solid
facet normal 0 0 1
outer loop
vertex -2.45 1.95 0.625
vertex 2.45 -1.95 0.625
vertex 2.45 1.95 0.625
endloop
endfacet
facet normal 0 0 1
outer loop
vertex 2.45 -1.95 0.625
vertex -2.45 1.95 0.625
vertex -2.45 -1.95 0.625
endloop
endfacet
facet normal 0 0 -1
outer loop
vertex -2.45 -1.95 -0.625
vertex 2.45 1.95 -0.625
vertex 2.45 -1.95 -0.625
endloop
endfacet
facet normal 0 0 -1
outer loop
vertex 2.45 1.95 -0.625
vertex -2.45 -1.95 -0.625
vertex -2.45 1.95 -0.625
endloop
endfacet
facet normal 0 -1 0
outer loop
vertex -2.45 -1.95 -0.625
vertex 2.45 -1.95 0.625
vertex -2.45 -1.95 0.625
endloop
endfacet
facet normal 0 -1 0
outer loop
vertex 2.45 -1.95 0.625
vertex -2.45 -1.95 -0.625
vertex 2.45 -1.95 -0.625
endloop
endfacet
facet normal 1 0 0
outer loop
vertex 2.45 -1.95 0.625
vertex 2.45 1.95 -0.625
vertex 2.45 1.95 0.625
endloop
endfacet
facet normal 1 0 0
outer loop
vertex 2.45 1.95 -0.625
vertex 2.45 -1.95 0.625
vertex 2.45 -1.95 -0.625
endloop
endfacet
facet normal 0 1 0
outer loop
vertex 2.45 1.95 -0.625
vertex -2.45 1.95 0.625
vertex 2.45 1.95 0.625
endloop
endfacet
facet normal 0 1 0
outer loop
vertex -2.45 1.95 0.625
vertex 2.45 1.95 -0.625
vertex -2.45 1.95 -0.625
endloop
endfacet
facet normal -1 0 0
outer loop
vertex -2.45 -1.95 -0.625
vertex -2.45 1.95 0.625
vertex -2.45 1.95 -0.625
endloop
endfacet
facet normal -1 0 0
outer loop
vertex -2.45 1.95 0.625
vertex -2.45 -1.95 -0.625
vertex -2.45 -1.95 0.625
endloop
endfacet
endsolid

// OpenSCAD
translate([-4.90/2, -3.90/2, -1.25/2])
    cube([4.90, 3.90, 1.25]);
